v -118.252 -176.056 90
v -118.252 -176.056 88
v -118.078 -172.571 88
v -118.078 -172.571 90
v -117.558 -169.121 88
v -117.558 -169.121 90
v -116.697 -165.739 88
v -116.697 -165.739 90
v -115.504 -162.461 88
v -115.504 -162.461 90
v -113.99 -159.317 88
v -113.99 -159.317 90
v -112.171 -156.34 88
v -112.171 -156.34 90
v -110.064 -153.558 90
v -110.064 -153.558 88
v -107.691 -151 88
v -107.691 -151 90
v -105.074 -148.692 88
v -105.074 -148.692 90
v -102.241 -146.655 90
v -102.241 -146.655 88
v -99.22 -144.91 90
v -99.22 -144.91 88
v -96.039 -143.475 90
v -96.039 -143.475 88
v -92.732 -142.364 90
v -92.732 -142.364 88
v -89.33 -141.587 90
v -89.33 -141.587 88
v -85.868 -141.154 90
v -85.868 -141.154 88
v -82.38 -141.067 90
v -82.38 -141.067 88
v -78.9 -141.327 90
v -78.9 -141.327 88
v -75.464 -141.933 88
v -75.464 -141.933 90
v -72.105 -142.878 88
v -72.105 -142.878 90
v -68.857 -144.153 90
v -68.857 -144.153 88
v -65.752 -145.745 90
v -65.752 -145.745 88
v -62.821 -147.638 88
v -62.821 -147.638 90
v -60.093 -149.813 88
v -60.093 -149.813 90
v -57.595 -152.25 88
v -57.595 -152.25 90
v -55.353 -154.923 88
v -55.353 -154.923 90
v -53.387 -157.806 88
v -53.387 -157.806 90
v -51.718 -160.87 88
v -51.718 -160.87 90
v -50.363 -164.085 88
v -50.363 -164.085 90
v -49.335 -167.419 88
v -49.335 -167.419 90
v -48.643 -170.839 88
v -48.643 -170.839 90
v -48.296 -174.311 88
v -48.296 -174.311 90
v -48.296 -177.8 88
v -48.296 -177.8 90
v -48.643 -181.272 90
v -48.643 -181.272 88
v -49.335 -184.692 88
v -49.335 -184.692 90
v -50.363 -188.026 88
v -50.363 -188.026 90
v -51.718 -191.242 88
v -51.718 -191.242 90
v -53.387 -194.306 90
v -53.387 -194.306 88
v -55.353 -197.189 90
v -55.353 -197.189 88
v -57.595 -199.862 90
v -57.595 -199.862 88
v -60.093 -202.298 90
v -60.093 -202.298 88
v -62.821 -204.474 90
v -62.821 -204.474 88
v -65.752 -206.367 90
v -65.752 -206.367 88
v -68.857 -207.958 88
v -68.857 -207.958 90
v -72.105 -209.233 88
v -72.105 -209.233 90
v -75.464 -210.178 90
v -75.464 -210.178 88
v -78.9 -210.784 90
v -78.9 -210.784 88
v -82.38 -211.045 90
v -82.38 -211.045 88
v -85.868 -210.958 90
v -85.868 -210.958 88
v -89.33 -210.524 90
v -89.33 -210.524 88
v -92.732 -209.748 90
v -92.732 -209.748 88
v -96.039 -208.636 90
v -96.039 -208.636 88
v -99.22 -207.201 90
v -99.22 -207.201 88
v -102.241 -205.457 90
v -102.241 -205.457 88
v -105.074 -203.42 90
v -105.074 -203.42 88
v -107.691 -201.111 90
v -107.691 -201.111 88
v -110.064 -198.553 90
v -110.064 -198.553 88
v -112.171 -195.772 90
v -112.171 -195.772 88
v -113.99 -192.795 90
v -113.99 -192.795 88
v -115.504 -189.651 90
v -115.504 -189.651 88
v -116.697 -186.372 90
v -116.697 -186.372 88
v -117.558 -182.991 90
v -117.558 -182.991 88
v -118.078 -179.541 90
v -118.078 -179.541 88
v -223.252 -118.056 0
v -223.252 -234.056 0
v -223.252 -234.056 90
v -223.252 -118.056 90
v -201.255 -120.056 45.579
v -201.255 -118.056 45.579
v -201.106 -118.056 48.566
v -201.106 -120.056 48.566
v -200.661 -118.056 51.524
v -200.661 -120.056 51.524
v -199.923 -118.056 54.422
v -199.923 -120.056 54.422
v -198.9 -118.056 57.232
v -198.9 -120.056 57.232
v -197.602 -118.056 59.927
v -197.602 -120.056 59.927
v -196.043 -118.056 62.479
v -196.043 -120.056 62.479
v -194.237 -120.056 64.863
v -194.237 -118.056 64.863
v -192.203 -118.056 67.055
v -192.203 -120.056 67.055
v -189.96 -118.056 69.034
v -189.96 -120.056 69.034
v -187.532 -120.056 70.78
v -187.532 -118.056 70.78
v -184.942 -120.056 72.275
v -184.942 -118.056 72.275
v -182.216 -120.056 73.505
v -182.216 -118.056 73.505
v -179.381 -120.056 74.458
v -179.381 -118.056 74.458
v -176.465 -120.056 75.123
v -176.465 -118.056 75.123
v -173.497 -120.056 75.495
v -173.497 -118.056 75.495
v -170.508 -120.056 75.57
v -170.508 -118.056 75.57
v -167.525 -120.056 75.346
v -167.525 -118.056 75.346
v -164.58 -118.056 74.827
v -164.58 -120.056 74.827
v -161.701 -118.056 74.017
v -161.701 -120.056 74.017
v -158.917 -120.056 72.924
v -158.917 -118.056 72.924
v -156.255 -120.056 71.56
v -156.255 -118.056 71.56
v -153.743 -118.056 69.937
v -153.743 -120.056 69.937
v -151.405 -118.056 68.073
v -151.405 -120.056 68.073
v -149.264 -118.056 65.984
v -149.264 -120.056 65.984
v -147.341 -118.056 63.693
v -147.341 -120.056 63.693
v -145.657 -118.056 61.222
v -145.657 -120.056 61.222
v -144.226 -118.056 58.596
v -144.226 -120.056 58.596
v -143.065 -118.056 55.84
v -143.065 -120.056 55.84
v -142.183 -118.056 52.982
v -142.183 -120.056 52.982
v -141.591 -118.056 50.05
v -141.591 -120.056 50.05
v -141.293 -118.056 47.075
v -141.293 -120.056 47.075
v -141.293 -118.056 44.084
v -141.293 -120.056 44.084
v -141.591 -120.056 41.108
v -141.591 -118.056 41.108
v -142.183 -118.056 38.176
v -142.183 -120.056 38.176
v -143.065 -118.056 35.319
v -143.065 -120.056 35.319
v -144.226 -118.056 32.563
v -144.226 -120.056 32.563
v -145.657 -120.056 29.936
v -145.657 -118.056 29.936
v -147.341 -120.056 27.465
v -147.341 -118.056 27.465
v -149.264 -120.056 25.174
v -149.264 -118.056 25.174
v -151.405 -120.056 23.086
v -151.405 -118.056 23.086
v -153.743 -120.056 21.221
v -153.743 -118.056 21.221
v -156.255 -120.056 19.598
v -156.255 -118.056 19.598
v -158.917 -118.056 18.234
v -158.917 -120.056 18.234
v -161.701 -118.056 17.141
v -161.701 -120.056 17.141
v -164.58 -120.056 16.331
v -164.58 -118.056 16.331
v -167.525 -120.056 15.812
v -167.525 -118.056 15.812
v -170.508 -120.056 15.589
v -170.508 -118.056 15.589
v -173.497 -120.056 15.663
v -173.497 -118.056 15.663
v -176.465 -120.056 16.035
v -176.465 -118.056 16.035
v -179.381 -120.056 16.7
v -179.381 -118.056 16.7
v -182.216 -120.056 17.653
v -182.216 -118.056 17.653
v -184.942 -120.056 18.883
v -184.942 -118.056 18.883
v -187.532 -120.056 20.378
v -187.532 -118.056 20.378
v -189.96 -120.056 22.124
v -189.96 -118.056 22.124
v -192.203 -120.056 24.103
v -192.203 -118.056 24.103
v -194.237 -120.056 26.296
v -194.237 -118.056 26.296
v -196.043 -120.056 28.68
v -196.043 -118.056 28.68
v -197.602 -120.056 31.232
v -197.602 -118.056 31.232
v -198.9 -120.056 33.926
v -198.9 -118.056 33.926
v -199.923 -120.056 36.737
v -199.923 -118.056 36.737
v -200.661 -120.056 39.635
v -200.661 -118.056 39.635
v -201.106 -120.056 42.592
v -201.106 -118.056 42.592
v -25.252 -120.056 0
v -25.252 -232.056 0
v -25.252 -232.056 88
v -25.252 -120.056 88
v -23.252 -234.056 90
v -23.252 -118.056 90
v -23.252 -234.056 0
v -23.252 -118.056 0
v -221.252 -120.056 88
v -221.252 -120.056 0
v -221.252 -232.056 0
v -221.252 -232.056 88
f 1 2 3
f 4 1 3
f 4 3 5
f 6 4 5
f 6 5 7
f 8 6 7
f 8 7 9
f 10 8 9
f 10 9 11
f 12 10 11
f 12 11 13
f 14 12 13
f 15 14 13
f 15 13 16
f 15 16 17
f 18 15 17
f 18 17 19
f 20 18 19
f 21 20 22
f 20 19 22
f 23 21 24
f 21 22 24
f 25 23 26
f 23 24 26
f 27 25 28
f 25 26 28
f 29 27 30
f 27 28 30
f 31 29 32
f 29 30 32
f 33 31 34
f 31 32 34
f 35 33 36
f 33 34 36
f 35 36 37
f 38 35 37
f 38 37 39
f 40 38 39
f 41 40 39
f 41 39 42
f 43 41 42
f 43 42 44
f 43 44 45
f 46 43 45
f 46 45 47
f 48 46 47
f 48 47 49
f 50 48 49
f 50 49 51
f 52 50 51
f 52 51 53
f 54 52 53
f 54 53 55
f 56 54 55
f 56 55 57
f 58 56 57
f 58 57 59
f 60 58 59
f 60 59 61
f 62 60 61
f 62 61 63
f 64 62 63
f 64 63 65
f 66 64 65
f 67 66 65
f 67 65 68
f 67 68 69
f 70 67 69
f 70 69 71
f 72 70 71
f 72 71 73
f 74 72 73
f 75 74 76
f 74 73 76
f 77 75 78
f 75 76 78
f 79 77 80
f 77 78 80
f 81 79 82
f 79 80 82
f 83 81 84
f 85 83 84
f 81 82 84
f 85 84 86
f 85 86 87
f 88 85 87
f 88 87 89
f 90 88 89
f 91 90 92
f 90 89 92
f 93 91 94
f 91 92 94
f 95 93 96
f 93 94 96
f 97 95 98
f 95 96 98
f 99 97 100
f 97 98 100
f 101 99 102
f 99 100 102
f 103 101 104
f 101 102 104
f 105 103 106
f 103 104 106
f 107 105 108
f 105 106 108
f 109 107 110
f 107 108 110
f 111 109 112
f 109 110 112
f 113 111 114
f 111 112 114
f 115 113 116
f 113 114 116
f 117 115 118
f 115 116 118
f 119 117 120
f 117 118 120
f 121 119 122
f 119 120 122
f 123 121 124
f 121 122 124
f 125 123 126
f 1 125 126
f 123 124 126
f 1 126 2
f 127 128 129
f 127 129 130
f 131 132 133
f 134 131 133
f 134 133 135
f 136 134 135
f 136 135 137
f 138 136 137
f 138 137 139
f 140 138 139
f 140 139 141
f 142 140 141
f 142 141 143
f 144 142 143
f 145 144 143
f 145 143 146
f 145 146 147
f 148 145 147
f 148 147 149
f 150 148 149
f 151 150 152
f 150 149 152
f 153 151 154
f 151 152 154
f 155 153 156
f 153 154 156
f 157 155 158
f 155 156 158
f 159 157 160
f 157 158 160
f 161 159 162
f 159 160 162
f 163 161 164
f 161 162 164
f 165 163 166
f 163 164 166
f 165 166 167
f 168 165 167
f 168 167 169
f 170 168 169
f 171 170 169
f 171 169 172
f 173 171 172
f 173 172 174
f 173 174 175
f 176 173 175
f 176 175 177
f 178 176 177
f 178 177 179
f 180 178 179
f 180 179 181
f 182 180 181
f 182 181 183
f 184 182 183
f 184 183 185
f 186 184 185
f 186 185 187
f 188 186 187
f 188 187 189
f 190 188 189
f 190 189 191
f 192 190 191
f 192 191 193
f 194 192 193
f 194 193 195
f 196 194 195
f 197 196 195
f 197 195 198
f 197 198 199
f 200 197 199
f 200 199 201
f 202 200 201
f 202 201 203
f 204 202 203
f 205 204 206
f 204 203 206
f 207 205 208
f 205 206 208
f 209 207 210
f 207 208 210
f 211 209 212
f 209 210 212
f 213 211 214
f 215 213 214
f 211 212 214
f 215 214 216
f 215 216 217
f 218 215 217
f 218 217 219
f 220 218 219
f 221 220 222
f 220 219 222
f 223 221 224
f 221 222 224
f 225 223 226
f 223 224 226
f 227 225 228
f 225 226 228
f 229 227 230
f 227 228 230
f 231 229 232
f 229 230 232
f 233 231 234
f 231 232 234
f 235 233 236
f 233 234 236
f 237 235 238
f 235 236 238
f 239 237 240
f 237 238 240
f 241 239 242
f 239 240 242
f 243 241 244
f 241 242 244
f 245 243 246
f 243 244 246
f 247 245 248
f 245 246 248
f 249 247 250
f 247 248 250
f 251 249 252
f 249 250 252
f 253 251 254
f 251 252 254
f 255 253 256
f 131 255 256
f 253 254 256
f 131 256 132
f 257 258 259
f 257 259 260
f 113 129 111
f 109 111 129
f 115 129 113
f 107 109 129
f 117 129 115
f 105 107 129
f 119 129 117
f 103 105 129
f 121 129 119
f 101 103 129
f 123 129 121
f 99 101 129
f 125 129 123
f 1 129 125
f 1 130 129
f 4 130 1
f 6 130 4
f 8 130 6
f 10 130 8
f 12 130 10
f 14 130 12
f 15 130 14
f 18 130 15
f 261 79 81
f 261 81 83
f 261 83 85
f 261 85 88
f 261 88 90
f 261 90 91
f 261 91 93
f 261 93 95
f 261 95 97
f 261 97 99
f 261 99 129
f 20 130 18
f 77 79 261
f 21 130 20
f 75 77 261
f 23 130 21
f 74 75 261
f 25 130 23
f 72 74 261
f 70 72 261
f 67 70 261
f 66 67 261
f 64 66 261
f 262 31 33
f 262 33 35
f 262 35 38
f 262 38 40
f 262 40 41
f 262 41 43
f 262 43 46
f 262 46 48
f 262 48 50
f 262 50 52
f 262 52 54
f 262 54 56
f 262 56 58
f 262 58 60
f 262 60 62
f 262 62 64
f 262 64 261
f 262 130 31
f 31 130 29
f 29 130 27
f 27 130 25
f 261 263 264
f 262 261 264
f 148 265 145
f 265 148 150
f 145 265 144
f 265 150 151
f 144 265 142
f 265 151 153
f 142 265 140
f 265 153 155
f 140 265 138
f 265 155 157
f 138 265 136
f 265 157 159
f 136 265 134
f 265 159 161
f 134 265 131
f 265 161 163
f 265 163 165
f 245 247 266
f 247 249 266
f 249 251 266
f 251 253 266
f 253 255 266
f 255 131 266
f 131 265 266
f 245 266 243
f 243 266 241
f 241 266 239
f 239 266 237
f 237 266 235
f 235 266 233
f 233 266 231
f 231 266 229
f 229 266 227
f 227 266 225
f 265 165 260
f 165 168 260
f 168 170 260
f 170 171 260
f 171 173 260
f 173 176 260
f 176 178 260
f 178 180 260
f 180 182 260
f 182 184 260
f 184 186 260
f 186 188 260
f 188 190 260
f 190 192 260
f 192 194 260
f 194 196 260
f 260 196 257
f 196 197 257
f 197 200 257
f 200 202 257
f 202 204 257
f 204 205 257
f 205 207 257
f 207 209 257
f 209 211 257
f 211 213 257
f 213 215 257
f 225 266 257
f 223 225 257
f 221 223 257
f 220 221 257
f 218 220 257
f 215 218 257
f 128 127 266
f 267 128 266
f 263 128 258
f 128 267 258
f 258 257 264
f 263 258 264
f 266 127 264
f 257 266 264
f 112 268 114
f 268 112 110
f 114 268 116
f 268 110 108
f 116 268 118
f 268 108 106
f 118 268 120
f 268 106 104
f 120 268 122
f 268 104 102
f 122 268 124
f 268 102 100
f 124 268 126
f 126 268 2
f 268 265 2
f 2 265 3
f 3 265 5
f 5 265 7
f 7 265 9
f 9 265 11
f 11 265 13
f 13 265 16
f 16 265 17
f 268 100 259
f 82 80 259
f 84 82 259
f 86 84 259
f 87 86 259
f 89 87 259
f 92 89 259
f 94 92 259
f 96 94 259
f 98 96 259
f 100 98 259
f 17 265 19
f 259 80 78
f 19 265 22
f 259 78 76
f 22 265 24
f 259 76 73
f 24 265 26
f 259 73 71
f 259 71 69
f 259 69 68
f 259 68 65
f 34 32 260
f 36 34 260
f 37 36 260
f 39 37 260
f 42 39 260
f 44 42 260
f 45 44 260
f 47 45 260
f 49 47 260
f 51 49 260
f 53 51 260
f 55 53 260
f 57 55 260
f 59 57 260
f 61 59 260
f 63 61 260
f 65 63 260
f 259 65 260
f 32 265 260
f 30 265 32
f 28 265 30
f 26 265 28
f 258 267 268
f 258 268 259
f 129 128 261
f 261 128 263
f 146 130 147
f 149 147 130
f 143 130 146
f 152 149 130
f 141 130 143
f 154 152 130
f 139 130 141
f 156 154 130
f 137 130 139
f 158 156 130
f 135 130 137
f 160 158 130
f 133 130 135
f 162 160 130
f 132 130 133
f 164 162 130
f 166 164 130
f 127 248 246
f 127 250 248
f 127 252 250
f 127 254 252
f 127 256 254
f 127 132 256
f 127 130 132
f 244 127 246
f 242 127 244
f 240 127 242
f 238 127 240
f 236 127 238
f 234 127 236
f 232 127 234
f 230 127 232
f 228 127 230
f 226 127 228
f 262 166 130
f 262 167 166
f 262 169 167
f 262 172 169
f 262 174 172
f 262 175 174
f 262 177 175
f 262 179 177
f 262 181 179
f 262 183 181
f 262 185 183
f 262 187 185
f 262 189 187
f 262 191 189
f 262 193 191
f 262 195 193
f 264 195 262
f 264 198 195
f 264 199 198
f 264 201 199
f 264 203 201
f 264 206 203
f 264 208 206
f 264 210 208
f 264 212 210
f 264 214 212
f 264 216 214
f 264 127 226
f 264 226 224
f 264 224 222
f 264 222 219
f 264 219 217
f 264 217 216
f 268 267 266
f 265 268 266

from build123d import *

# Parameters (mm, degrees)
SKETCH1_W           = 200
SKETCH1_H           = 116
BOSS_EXTRUDE1_DEPTH = 90
SHELL1_T            = -2
SKETCH2_R           = 35
CUT_EXTRUDE1_DEPTH  = 10
SKETCH3_R           = 30
CUT_EXTRUDE2_DEPTH  = 10


with BuildPart() as part:
    # Sketch1 → Boss-Extrude1 (new body)
    with BuildSketch(Plane.XY):
        with Locations((-123.252218957, -176.05574429)):
            Rectangle(SKETCH1_W, SKETCH1_H)
    extrude(amount=BOSS_EXTRUDE1_DEPTH)

    # Shell1
    shell1_openings = [part.faces().sort_by_distance(p)[0] for p in [
        (-123.252218957, -176.05574429, 0),
    ]]
    offset(amount=SHELL1_T, openings=shell1_openings, kind=Kind.INTERSECTION)

    # Sketch2 → Cut-Extrude1 (cut)
    with BuildSketch(Plane(origin=(0, 0, 88), x_dir=(-1, 0, 0), z_dir=(0, 0, -1))):
        with Locations((83.252218957, -176.05574429)):
            Circle(SKETCH2_R)
    extrude(amount=-CUT_EXTRUDE1_DEPTH, mode=Mode.SUBTRACT)

    # Sketch3 → Cut-Extrude2 (cut)
    with BuildSketch(Plane(origin=(0, -118.05574429, 0), x_dir=(1, 0, 0), z_dir=(0, 1, 0))):
        with Locations(Location((-171.255446698, -45.579189532, 0), (0, 0, 180))):
            Circle(SKETCH3_R)
    extrude(amount=-CUT_EXTRUDE2_DEPTH, mode=Mode.SUBTRACT)


solid = part.part
